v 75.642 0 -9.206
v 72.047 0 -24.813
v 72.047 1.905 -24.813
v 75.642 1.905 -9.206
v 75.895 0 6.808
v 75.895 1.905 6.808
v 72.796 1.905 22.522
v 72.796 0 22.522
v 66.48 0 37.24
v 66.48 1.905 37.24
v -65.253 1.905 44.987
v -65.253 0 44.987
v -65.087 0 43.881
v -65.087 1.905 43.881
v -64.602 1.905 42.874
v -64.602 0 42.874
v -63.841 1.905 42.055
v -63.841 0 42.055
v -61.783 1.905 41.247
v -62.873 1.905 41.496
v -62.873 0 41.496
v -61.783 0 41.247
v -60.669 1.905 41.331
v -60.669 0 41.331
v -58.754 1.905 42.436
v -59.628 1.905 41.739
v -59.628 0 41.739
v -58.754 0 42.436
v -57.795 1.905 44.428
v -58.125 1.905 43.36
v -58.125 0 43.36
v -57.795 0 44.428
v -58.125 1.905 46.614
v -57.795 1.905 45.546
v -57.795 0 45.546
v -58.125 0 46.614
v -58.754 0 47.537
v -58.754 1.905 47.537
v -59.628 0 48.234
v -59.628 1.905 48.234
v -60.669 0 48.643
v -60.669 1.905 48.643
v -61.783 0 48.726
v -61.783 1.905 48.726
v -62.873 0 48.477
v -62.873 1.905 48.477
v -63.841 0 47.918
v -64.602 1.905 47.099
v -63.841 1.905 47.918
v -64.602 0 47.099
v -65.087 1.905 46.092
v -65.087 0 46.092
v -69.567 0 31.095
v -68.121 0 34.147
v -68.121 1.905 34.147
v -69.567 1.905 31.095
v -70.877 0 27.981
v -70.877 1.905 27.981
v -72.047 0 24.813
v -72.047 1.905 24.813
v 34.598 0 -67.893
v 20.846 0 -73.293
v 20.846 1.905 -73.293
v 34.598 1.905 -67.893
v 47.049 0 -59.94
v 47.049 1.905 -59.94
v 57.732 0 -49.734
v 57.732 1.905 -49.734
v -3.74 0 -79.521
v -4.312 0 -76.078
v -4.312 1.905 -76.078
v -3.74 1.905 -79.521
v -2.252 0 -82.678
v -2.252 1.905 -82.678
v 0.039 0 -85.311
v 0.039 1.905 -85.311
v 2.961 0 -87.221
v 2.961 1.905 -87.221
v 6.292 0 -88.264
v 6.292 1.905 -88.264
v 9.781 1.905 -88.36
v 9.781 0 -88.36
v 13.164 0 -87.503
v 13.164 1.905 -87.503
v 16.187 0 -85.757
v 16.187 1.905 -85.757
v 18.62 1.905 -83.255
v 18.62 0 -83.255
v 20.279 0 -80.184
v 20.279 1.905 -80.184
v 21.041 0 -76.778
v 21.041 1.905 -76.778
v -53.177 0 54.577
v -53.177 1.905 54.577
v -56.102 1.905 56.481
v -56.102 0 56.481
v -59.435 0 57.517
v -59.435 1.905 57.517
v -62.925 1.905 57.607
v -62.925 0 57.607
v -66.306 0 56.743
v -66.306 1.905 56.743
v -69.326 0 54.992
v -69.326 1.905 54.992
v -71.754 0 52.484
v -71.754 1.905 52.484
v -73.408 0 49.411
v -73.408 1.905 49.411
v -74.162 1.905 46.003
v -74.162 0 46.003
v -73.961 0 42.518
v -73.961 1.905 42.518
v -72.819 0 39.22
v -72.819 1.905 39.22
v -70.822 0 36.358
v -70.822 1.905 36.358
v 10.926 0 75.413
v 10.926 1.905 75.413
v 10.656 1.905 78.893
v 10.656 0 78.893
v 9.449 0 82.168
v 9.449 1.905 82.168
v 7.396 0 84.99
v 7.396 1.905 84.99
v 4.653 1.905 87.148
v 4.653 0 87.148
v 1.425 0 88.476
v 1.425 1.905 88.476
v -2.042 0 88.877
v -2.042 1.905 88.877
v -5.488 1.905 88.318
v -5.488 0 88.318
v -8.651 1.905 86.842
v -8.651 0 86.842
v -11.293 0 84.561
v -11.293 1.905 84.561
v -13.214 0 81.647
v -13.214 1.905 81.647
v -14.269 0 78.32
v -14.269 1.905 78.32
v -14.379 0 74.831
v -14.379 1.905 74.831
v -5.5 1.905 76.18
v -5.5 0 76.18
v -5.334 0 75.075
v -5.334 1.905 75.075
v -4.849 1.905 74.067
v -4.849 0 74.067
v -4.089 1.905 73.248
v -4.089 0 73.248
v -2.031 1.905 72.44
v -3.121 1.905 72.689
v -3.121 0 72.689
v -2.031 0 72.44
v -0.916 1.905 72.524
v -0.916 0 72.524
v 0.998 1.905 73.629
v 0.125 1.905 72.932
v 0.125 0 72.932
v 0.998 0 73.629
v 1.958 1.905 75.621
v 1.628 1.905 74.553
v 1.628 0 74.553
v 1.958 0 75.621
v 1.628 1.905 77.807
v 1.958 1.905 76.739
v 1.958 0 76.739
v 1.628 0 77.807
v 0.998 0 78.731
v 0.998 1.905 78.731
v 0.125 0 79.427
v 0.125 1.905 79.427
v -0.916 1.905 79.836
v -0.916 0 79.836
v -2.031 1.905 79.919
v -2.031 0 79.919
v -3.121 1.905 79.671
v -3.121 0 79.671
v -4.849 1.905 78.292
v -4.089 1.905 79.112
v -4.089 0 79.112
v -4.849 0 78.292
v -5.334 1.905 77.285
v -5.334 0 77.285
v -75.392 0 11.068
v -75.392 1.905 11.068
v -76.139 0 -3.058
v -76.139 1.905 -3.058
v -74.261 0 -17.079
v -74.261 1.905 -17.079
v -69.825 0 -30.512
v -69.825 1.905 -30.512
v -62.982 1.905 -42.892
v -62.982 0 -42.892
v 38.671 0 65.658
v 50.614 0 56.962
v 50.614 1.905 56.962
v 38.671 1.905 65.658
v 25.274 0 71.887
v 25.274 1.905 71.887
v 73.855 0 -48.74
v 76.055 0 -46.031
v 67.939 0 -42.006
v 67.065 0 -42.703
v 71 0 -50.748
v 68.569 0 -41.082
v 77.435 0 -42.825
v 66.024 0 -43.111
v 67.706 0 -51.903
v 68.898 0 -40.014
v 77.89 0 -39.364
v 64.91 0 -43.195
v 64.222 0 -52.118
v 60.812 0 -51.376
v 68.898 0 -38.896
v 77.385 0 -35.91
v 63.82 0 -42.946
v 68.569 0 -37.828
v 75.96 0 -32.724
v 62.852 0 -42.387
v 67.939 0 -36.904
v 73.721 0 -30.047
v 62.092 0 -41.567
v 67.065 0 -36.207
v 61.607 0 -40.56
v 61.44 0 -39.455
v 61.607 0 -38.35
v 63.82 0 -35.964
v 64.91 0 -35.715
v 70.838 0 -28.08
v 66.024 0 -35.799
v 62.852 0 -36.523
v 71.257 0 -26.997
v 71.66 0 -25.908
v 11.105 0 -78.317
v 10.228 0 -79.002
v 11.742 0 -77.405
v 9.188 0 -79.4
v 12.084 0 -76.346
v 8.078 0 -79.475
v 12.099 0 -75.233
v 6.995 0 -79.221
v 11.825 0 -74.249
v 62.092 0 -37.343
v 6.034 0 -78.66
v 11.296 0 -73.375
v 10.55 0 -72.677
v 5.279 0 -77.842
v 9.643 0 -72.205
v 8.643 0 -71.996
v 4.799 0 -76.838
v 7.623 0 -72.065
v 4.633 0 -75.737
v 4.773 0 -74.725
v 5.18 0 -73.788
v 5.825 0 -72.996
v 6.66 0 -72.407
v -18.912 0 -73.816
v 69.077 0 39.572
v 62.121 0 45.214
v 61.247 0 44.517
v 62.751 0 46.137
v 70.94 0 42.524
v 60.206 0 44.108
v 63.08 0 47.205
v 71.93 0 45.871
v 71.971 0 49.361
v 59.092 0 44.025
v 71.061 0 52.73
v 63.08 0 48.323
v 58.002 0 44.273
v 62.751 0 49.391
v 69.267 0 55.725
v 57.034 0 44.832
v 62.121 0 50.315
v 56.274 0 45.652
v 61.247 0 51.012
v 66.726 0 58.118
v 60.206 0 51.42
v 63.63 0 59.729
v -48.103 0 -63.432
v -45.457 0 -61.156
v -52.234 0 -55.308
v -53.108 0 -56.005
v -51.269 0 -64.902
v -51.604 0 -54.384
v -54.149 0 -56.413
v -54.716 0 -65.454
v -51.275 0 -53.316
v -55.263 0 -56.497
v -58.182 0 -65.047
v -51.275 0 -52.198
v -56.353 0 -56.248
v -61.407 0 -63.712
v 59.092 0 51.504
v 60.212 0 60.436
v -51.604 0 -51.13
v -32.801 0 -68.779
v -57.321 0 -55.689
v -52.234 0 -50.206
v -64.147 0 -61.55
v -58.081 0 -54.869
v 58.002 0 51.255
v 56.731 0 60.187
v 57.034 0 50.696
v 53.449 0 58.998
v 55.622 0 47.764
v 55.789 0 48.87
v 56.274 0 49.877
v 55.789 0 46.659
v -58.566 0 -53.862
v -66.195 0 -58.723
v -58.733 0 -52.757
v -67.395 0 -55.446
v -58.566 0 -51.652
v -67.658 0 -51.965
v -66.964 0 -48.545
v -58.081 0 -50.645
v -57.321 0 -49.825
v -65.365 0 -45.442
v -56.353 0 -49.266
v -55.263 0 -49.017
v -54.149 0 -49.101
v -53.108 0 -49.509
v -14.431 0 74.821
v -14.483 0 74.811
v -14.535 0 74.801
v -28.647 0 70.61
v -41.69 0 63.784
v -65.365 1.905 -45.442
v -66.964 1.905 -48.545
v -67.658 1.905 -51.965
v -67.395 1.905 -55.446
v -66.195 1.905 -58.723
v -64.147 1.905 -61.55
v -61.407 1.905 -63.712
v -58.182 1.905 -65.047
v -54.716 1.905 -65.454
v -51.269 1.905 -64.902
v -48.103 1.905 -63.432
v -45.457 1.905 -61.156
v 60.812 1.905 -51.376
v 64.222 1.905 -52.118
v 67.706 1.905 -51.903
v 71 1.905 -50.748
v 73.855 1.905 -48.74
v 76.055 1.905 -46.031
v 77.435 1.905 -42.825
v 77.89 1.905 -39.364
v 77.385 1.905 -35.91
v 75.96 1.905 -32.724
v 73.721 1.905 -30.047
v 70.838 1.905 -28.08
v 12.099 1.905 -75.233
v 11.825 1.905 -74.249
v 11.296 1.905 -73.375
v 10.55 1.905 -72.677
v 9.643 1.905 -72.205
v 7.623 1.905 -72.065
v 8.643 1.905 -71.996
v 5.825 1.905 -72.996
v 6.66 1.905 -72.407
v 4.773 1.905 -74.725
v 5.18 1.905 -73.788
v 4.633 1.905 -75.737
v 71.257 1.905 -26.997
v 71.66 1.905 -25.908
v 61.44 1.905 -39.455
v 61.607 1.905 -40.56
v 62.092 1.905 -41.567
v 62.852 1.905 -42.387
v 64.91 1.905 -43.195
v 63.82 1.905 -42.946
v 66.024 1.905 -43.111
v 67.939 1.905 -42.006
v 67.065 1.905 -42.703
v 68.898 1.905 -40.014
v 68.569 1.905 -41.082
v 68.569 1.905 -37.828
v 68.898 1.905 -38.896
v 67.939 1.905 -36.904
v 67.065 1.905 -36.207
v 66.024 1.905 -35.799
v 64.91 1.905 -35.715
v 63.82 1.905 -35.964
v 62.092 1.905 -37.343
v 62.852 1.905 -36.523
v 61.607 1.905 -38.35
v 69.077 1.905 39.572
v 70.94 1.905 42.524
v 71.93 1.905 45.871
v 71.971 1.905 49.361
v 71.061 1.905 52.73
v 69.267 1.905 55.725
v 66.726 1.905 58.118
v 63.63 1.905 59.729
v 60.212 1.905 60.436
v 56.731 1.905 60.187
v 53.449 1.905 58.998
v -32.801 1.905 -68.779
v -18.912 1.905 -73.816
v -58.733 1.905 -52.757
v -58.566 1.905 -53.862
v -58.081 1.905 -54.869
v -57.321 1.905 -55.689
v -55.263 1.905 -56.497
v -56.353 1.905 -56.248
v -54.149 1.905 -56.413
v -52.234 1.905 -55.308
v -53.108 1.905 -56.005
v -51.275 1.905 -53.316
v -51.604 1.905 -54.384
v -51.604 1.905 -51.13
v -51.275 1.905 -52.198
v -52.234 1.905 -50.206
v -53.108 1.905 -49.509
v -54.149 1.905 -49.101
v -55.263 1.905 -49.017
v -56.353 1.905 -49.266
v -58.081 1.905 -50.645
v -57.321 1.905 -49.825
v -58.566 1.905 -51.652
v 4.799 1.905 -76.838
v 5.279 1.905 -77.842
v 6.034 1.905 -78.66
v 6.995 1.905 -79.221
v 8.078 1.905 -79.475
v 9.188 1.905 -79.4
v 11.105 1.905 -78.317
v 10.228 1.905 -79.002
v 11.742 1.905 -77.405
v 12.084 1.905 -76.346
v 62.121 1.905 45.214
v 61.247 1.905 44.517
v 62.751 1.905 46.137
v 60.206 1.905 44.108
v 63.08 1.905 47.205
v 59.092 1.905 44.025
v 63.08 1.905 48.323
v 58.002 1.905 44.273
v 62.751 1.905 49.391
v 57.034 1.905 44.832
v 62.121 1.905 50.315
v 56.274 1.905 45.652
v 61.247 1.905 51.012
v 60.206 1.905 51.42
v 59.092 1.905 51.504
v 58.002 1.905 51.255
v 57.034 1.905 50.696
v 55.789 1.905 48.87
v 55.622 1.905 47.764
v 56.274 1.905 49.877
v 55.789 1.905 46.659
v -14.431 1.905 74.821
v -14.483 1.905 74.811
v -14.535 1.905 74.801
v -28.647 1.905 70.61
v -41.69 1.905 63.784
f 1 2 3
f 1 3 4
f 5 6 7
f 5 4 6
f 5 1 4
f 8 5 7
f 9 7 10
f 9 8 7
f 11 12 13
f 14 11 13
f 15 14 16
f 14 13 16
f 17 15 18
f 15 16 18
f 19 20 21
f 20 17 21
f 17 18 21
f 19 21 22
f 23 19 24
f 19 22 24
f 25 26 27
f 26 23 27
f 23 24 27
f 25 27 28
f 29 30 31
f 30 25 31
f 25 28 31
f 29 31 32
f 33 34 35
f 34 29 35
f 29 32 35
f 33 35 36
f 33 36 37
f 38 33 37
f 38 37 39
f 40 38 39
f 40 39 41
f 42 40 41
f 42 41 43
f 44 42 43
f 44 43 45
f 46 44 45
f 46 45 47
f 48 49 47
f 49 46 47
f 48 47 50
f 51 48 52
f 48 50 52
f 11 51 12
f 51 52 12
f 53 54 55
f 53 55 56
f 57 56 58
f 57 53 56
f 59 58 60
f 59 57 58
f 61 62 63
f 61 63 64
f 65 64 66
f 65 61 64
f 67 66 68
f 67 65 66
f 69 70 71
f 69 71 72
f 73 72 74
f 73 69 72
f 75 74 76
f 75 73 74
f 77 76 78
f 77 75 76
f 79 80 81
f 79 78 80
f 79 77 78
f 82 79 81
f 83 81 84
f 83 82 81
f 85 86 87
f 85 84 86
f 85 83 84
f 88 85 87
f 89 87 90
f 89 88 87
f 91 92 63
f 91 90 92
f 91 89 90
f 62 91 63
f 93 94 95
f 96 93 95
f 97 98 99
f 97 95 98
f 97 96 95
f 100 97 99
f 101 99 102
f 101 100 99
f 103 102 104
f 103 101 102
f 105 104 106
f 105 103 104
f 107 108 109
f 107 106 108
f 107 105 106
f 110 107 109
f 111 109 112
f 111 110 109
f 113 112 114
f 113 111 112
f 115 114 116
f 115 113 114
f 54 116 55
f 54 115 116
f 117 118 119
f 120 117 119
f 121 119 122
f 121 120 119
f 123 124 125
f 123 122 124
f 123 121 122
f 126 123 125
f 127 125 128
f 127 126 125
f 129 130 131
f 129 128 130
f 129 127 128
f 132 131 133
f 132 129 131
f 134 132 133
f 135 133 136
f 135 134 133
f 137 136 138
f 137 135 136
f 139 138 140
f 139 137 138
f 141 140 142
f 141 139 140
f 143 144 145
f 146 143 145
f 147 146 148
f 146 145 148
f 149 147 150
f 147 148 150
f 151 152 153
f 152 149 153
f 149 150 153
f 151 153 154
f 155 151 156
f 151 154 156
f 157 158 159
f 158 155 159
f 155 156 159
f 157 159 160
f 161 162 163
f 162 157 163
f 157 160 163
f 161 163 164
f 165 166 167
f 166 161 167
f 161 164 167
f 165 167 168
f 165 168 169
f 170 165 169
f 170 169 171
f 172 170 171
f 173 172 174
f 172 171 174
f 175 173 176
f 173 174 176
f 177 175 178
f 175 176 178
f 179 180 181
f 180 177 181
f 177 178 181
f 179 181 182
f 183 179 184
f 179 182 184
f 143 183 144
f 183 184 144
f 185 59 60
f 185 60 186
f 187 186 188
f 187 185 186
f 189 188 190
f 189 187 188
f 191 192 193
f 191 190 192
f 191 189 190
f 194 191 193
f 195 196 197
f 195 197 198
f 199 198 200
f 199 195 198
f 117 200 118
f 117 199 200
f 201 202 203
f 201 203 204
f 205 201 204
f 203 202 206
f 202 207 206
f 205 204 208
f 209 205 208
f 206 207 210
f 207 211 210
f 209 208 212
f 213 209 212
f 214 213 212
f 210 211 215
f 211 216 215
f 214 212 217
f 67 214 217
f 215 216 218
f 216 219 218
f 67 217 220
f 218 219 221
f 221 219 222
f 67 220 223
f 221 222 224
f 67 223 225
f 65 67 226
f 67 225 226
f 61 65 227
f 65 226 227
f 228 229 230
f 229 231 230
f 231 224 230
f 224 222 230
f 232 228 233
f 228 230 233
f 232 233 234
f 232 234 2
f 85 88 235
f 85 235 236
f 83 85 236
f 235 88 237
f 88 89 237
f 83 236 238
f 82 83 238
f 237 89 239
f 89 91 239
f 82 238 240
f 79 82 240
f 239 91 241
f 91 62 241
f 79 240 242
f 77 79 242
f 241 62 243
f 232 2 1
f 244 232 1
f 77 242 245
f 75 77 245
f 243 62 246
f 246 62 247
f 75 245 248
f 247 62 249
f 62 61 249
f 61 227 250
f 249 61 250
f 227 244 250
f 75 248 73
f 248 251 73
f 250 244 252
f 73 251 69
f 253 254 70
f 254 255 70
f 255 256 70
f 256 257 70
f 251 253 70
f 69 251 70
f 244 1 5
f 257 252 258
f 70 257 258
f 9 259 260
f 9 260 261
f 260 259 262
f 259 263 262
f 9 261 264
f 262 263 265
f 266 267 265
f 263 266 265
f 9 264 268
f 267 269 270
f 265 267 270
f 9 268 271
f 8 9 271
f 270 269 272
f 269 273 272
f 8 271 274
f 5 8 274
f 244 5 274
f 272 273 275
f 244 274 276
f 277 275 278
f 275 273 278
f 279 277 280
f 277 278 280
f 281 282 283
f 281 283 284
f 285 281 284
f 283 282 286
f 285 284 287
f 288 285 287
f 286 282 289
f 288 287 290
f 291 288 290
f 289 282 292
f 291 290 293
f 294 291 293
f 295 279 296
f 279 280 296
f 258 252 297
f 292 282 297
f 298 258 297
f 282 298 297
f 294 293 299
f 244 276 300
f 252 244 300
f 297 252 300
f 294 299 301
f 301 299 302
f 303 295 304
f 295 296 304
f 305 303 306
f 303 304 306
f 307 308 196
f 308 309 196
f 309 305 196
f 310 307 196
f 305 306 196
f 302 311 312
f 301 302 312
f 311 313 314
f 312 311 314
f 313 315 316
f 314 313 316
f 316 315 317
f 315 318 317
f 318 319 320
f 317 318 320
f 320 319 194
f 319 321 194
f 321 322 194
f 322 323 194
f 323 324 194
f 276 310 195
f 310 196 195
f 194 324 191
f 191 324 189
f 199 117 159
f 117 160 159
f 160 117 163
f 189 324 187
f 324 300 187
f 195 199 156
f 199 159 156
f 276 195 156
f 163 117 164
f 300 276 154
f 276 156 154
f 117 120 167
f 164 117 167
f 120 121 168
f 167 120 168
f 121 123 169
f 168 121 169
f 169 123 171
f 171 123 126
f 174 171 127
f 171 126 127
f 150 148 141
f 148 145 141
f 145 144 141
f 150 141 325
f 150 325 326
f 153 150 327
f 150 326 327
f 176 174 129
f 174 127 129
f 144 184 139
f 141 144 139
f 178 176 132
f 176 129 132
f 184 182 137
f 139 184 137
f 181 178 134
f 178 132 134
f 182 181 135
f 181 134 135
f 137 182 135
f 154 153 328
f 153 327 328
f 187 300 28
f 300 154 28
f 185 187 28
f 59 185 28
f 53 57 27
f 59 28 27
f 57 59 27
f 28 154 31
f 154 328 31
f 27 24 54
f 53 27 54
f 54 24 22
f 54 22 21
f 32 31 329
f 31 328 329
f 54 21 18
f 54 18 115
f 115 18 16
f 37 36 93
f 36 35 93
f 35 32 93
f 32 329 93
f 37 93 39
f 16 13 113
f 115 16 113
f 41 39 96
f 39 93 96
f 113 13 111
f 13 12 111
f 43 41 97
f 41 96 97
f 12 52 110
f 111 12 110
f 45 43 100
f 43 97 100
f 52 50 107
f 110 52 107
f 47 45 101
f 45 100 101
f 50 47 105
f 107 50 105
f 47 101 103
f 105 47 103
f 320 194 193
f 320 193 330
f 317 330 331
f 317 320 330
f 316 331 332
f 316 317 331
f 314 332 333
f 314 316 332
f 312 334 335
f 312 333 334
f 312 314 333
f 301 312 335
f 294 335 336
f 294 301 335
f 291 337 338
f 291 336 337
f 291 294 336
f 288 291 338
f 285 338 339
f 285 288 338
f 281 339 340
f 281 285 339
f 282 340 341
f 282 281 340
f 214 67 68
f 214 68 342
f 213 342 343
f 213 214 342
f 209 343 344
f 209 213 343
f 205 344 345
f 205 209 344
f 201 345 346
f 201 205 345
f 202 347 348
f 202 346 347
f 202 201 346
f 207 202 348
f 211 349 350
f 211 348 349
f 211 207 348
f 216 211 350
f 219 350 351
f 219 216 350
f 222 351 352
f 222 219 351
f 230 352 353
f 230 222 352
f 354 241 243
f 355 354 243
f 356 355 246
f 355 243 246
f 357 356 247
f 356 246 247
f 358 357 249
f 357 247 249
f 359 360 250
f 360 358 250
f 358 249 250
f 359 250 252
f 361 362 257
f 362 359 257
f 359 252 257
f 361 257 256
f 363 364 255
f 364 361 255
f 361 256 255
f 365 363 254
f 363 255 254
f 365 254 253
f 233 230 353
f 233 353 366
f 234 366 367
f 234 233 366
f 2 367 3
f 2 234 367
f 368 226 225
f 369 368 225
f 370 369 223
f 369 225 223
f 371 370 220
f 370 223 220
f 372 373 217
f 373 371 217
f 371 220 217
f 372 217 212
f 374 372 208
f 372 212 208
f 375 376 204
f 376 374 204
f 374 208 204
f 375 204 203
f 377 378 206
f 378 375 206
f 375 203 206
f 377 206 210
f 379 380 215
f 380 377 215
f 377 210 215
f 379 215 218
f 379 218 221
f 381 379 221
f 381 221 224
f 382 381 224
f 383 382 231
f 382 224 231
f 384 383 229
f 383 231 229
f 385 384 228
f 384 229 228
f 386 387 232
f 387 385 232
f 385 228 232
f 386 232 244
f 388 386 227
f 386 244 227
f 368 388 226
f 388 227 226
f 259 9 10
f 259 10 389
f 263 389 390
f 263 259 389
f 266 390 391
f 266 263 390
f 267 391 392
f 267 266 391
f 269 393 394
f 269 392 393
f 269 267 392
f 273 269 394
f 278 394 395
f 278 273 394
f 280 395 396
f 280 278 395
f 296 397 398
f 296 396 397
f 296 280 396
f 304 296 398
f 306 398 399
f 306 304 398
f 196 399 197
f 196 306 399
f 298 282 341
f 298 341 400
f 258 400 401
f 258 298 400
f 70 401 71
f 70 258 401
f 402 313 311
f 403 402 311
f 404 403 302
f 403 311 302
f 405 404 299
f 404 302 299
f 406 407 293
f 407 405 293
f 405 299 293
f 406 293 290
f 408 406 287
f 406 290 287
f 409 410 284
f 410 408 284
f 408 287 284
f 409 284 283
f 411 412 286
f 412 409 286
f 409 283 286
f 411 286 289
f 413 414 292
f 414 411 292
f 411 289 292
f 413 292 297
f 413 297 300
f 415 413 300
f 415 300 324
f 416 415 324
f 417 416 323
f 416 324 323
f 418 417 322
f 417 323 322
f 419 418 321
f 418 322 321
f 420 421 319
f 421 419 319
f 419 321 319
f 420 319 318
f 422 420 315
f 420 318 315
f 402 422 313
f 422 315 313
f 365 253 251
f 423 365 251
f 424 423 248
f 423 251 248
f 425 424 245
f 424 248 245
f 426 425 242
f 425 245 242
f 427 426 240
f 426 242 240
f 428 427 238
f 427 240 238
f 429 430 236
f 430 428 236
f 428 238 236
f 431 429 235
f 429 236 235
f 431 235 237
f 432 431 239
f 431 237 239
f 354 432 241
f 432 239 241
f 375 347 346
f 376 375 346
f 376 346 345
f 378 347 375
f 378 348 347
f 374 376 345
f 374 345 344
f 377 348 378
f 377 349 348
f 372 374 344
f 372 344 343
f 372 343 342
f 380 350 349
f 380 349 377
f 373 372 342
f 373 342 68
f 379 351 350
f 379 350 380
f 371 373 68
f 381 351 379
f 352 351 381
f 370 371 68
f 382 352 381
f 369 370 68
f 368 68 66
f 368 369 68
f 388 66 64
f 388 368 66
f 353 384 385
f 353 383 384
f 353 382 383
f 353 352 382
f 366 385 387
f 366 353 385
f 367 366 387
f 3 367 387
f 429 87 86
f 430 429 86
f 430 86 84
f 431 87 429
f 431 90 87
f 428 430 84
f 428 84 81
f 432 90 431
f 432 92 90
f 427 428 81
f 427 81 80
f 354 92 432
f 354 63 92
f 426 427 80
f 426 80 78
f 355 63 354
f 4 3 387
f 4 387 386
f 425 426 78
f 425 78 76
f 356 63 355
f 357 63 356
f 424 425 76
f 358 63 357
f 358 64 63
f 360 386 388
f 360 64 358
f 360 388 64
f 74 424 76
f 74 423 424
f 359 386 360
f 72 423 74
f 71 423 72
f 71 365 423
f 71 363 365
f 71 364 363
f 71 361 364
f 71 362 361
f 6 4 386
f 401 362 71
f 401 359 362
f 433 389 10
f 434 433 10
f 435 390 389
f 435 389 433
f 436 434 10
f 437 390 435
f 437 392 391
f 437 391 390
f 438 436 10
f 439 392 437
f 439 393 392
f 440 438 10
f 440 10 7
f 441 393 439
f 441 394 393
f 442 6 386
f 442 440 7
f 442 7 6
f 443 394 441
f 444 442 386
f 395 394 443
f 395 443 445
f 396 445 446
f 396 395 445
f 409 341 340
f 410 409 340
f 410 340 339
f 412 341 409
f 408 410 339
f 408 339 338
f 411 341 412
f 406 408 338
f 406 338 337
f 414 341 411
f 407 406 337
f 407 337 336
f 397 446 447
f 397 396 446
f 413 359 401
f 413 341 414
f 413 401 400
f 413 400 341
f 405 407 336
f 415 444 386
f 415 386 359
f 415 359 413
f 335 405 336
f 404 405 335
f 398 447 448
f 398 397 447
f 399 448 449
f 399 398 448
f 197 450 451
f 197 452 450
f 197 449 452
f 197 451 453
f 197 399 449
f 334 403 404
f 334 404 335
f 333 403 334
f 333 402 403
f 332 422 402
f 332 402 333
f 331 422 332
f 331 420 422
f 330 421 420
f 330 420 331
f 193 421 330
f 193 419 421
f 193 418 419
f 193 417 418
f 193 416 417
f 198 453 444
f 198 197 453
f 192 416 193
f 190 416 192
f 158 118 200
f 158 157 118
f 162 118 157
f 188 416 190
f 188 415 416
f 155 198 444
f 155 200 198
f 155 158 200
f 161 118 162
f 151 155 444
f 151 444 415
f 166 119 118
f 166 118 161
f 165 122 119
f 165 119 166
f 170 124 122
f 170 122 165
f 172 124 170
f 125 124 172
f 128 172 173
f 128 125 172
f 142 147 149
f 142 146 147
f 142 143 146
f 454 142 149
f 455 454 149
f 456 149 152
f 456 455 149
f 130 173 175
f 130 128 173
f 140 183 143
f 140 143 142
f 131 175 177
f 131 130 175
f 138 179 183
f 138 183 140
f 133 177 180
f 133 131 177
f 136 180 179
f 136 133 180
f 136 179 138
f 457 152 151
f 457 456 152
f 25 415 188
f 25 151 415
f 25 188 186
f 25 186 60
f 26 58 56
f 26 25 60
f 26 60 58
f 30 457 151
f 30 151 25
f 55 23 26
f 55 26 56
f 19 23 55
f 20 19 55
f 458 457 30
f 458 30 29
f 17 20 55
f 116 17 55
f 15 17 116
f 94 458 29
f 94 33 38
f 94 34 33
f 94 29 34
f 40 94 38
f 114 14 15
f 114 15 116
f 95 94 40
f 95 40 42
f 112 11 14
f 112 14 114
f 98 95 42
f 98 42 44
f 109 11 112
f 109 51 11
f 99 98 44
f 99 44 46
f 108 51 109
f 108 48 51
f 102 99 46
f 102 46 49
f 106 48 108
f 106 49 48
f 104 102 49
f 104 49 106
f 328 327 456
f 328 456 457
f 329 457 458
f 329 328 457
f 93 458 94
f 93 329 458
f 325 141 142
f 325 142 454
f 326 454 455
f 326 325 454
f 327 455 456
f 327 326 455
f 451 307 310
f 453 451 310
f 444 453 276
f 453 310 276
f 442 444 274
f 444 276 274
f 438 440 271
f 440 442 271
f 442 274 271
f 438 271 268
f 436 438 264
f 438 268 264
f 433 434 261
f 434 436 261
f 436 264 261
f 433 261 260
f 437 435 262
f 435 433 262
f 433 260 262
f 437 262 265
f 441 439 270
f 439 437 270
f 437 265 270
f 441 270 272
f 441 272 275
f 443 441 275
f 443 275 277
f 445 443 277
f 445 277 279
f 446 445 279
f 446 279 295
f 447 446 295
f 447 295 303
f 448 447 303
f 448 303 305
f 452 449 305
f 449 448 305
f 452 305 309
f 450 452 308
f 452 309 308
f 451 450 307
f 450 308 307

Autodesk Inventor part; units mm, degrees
ref_plane "YZ Plane" through (0, 0, 0) normal (1, 0, 0) x (0, 1, 0)
ref_plane "XZ Plane" through (0, 0, 0) normal (0, 1, 0) x (-1, 0, 0)
ref_plane "XY Plane" through (0, 0, 0) normal (0, 0, 1) x (1, 0, 0)
sketch "Sketch1" plane through (0, 0, 0) normal (0, 1, 0) x (-1, 0, 0)
  arc A0 (45.4572, -61.1563) -> (62.9817, -42.8923) centre (54.9831, -52.757) ccw
  circle A1 centre (54.9831, -52.757) radius 3.75
  circle A2 centre (73.1804, 21.2382) radius 3.75 construction
  circle A3 centre (18.1974, 73.9952) radius 3.75 construction
  circle A4 centre (-54.9831, 52.757) radius 3.75 construction
  circle A5 centre (-73.1804, -21.2382) radius 3.75 construction
  circle A6 centre (-18.1974, -73.9952) radius 3.75 construction
  arc A7 (62.9817, -42.8923) -> (72.047, 24.8128) centre (0, 0) ccw
  arc A8 (-66.4803, 37.2399) -> (-72.047, -24.8128) centre (0, 0) ccw
  arc A9 (-20.846, -73.2932) -> (4.312, -76.0779) centre (-8.3834, -75.7374) ccw
  arc A10 (-70.8376, -28.0798) -> (-57.7316, -49.7343) centre (-65.19, -39.455) ccw
  arc A11 (-50.6143, 56.9617) -> (-66.4803, 37.2399) centre (-59.3719, 47.7642) ccw
  arc A12 (14.3787, 74.8311) -> (-10.9263, 75.4126) centre (1.7505, 76.1799) ccw
  arc A13 (68.1207, 34.1469) -> (53.1773, 54.5767) centre (61.5032, 44.9866) ccw
  circle A14 centre (-8.3834, -75.7374) radius 3.75
  circle A15 centre (-65.19, -39.455) radius 3.75
  circle A16 centre (-59.3719, 47.7642) radius 3.75
  circle A17 centre (1.7505, 76.1799) radius 3.75
  circle A18 centre (61.5032, 44.9866) radius 3.75
  arc A19 (-14.535, -74.8009) -> (-12.0993, -75.2333) centre (0, 0) ccw
  arc A20 (4.312, -76.0779) -> (45.4572, -61.1563) centre (0, 0) ccw
  arc A21 (-72.047, -24.8128) -> (-70.8376, -28.0798) centre (0, 0) ccw
  arc A22 (-57.7316, -49.7343) -> (-20.846, -73.2932) centre (0, 0) ccw
  arc A23 (14.535, 74.8009) -> (14.3787, 74.8311) centre (0, 0) ccw
  arc A24 (-10.9263, 75.4126) -> (-50.6143, 56.9617) centre (0, 0) ccw
  arc A25 (72.047, 24.8128) -> (68.1207, 34.1469) centre (0, 0) ccw
  arc A26 (53.1773, 54.5767) -> (14.535, 74.8009) centre (0, 0) ccw
  point P0 (73.9952, -18.1974)
  dimension "d7" = 25.4
  dimension "d15" = 7.5
  dimension "d18" = 360
  dimension "d22" = 52.5
  dimension "d23" = 80
  dimension "d24" = 52.5
  dimension "d25" = 52.5
  dimension "d26" = 52.5
  dimension "d27" = 70
extrude "Extrusion1" add sketch "Sketch1" along normal blind 1.905
properties part number "Base_bottom"
